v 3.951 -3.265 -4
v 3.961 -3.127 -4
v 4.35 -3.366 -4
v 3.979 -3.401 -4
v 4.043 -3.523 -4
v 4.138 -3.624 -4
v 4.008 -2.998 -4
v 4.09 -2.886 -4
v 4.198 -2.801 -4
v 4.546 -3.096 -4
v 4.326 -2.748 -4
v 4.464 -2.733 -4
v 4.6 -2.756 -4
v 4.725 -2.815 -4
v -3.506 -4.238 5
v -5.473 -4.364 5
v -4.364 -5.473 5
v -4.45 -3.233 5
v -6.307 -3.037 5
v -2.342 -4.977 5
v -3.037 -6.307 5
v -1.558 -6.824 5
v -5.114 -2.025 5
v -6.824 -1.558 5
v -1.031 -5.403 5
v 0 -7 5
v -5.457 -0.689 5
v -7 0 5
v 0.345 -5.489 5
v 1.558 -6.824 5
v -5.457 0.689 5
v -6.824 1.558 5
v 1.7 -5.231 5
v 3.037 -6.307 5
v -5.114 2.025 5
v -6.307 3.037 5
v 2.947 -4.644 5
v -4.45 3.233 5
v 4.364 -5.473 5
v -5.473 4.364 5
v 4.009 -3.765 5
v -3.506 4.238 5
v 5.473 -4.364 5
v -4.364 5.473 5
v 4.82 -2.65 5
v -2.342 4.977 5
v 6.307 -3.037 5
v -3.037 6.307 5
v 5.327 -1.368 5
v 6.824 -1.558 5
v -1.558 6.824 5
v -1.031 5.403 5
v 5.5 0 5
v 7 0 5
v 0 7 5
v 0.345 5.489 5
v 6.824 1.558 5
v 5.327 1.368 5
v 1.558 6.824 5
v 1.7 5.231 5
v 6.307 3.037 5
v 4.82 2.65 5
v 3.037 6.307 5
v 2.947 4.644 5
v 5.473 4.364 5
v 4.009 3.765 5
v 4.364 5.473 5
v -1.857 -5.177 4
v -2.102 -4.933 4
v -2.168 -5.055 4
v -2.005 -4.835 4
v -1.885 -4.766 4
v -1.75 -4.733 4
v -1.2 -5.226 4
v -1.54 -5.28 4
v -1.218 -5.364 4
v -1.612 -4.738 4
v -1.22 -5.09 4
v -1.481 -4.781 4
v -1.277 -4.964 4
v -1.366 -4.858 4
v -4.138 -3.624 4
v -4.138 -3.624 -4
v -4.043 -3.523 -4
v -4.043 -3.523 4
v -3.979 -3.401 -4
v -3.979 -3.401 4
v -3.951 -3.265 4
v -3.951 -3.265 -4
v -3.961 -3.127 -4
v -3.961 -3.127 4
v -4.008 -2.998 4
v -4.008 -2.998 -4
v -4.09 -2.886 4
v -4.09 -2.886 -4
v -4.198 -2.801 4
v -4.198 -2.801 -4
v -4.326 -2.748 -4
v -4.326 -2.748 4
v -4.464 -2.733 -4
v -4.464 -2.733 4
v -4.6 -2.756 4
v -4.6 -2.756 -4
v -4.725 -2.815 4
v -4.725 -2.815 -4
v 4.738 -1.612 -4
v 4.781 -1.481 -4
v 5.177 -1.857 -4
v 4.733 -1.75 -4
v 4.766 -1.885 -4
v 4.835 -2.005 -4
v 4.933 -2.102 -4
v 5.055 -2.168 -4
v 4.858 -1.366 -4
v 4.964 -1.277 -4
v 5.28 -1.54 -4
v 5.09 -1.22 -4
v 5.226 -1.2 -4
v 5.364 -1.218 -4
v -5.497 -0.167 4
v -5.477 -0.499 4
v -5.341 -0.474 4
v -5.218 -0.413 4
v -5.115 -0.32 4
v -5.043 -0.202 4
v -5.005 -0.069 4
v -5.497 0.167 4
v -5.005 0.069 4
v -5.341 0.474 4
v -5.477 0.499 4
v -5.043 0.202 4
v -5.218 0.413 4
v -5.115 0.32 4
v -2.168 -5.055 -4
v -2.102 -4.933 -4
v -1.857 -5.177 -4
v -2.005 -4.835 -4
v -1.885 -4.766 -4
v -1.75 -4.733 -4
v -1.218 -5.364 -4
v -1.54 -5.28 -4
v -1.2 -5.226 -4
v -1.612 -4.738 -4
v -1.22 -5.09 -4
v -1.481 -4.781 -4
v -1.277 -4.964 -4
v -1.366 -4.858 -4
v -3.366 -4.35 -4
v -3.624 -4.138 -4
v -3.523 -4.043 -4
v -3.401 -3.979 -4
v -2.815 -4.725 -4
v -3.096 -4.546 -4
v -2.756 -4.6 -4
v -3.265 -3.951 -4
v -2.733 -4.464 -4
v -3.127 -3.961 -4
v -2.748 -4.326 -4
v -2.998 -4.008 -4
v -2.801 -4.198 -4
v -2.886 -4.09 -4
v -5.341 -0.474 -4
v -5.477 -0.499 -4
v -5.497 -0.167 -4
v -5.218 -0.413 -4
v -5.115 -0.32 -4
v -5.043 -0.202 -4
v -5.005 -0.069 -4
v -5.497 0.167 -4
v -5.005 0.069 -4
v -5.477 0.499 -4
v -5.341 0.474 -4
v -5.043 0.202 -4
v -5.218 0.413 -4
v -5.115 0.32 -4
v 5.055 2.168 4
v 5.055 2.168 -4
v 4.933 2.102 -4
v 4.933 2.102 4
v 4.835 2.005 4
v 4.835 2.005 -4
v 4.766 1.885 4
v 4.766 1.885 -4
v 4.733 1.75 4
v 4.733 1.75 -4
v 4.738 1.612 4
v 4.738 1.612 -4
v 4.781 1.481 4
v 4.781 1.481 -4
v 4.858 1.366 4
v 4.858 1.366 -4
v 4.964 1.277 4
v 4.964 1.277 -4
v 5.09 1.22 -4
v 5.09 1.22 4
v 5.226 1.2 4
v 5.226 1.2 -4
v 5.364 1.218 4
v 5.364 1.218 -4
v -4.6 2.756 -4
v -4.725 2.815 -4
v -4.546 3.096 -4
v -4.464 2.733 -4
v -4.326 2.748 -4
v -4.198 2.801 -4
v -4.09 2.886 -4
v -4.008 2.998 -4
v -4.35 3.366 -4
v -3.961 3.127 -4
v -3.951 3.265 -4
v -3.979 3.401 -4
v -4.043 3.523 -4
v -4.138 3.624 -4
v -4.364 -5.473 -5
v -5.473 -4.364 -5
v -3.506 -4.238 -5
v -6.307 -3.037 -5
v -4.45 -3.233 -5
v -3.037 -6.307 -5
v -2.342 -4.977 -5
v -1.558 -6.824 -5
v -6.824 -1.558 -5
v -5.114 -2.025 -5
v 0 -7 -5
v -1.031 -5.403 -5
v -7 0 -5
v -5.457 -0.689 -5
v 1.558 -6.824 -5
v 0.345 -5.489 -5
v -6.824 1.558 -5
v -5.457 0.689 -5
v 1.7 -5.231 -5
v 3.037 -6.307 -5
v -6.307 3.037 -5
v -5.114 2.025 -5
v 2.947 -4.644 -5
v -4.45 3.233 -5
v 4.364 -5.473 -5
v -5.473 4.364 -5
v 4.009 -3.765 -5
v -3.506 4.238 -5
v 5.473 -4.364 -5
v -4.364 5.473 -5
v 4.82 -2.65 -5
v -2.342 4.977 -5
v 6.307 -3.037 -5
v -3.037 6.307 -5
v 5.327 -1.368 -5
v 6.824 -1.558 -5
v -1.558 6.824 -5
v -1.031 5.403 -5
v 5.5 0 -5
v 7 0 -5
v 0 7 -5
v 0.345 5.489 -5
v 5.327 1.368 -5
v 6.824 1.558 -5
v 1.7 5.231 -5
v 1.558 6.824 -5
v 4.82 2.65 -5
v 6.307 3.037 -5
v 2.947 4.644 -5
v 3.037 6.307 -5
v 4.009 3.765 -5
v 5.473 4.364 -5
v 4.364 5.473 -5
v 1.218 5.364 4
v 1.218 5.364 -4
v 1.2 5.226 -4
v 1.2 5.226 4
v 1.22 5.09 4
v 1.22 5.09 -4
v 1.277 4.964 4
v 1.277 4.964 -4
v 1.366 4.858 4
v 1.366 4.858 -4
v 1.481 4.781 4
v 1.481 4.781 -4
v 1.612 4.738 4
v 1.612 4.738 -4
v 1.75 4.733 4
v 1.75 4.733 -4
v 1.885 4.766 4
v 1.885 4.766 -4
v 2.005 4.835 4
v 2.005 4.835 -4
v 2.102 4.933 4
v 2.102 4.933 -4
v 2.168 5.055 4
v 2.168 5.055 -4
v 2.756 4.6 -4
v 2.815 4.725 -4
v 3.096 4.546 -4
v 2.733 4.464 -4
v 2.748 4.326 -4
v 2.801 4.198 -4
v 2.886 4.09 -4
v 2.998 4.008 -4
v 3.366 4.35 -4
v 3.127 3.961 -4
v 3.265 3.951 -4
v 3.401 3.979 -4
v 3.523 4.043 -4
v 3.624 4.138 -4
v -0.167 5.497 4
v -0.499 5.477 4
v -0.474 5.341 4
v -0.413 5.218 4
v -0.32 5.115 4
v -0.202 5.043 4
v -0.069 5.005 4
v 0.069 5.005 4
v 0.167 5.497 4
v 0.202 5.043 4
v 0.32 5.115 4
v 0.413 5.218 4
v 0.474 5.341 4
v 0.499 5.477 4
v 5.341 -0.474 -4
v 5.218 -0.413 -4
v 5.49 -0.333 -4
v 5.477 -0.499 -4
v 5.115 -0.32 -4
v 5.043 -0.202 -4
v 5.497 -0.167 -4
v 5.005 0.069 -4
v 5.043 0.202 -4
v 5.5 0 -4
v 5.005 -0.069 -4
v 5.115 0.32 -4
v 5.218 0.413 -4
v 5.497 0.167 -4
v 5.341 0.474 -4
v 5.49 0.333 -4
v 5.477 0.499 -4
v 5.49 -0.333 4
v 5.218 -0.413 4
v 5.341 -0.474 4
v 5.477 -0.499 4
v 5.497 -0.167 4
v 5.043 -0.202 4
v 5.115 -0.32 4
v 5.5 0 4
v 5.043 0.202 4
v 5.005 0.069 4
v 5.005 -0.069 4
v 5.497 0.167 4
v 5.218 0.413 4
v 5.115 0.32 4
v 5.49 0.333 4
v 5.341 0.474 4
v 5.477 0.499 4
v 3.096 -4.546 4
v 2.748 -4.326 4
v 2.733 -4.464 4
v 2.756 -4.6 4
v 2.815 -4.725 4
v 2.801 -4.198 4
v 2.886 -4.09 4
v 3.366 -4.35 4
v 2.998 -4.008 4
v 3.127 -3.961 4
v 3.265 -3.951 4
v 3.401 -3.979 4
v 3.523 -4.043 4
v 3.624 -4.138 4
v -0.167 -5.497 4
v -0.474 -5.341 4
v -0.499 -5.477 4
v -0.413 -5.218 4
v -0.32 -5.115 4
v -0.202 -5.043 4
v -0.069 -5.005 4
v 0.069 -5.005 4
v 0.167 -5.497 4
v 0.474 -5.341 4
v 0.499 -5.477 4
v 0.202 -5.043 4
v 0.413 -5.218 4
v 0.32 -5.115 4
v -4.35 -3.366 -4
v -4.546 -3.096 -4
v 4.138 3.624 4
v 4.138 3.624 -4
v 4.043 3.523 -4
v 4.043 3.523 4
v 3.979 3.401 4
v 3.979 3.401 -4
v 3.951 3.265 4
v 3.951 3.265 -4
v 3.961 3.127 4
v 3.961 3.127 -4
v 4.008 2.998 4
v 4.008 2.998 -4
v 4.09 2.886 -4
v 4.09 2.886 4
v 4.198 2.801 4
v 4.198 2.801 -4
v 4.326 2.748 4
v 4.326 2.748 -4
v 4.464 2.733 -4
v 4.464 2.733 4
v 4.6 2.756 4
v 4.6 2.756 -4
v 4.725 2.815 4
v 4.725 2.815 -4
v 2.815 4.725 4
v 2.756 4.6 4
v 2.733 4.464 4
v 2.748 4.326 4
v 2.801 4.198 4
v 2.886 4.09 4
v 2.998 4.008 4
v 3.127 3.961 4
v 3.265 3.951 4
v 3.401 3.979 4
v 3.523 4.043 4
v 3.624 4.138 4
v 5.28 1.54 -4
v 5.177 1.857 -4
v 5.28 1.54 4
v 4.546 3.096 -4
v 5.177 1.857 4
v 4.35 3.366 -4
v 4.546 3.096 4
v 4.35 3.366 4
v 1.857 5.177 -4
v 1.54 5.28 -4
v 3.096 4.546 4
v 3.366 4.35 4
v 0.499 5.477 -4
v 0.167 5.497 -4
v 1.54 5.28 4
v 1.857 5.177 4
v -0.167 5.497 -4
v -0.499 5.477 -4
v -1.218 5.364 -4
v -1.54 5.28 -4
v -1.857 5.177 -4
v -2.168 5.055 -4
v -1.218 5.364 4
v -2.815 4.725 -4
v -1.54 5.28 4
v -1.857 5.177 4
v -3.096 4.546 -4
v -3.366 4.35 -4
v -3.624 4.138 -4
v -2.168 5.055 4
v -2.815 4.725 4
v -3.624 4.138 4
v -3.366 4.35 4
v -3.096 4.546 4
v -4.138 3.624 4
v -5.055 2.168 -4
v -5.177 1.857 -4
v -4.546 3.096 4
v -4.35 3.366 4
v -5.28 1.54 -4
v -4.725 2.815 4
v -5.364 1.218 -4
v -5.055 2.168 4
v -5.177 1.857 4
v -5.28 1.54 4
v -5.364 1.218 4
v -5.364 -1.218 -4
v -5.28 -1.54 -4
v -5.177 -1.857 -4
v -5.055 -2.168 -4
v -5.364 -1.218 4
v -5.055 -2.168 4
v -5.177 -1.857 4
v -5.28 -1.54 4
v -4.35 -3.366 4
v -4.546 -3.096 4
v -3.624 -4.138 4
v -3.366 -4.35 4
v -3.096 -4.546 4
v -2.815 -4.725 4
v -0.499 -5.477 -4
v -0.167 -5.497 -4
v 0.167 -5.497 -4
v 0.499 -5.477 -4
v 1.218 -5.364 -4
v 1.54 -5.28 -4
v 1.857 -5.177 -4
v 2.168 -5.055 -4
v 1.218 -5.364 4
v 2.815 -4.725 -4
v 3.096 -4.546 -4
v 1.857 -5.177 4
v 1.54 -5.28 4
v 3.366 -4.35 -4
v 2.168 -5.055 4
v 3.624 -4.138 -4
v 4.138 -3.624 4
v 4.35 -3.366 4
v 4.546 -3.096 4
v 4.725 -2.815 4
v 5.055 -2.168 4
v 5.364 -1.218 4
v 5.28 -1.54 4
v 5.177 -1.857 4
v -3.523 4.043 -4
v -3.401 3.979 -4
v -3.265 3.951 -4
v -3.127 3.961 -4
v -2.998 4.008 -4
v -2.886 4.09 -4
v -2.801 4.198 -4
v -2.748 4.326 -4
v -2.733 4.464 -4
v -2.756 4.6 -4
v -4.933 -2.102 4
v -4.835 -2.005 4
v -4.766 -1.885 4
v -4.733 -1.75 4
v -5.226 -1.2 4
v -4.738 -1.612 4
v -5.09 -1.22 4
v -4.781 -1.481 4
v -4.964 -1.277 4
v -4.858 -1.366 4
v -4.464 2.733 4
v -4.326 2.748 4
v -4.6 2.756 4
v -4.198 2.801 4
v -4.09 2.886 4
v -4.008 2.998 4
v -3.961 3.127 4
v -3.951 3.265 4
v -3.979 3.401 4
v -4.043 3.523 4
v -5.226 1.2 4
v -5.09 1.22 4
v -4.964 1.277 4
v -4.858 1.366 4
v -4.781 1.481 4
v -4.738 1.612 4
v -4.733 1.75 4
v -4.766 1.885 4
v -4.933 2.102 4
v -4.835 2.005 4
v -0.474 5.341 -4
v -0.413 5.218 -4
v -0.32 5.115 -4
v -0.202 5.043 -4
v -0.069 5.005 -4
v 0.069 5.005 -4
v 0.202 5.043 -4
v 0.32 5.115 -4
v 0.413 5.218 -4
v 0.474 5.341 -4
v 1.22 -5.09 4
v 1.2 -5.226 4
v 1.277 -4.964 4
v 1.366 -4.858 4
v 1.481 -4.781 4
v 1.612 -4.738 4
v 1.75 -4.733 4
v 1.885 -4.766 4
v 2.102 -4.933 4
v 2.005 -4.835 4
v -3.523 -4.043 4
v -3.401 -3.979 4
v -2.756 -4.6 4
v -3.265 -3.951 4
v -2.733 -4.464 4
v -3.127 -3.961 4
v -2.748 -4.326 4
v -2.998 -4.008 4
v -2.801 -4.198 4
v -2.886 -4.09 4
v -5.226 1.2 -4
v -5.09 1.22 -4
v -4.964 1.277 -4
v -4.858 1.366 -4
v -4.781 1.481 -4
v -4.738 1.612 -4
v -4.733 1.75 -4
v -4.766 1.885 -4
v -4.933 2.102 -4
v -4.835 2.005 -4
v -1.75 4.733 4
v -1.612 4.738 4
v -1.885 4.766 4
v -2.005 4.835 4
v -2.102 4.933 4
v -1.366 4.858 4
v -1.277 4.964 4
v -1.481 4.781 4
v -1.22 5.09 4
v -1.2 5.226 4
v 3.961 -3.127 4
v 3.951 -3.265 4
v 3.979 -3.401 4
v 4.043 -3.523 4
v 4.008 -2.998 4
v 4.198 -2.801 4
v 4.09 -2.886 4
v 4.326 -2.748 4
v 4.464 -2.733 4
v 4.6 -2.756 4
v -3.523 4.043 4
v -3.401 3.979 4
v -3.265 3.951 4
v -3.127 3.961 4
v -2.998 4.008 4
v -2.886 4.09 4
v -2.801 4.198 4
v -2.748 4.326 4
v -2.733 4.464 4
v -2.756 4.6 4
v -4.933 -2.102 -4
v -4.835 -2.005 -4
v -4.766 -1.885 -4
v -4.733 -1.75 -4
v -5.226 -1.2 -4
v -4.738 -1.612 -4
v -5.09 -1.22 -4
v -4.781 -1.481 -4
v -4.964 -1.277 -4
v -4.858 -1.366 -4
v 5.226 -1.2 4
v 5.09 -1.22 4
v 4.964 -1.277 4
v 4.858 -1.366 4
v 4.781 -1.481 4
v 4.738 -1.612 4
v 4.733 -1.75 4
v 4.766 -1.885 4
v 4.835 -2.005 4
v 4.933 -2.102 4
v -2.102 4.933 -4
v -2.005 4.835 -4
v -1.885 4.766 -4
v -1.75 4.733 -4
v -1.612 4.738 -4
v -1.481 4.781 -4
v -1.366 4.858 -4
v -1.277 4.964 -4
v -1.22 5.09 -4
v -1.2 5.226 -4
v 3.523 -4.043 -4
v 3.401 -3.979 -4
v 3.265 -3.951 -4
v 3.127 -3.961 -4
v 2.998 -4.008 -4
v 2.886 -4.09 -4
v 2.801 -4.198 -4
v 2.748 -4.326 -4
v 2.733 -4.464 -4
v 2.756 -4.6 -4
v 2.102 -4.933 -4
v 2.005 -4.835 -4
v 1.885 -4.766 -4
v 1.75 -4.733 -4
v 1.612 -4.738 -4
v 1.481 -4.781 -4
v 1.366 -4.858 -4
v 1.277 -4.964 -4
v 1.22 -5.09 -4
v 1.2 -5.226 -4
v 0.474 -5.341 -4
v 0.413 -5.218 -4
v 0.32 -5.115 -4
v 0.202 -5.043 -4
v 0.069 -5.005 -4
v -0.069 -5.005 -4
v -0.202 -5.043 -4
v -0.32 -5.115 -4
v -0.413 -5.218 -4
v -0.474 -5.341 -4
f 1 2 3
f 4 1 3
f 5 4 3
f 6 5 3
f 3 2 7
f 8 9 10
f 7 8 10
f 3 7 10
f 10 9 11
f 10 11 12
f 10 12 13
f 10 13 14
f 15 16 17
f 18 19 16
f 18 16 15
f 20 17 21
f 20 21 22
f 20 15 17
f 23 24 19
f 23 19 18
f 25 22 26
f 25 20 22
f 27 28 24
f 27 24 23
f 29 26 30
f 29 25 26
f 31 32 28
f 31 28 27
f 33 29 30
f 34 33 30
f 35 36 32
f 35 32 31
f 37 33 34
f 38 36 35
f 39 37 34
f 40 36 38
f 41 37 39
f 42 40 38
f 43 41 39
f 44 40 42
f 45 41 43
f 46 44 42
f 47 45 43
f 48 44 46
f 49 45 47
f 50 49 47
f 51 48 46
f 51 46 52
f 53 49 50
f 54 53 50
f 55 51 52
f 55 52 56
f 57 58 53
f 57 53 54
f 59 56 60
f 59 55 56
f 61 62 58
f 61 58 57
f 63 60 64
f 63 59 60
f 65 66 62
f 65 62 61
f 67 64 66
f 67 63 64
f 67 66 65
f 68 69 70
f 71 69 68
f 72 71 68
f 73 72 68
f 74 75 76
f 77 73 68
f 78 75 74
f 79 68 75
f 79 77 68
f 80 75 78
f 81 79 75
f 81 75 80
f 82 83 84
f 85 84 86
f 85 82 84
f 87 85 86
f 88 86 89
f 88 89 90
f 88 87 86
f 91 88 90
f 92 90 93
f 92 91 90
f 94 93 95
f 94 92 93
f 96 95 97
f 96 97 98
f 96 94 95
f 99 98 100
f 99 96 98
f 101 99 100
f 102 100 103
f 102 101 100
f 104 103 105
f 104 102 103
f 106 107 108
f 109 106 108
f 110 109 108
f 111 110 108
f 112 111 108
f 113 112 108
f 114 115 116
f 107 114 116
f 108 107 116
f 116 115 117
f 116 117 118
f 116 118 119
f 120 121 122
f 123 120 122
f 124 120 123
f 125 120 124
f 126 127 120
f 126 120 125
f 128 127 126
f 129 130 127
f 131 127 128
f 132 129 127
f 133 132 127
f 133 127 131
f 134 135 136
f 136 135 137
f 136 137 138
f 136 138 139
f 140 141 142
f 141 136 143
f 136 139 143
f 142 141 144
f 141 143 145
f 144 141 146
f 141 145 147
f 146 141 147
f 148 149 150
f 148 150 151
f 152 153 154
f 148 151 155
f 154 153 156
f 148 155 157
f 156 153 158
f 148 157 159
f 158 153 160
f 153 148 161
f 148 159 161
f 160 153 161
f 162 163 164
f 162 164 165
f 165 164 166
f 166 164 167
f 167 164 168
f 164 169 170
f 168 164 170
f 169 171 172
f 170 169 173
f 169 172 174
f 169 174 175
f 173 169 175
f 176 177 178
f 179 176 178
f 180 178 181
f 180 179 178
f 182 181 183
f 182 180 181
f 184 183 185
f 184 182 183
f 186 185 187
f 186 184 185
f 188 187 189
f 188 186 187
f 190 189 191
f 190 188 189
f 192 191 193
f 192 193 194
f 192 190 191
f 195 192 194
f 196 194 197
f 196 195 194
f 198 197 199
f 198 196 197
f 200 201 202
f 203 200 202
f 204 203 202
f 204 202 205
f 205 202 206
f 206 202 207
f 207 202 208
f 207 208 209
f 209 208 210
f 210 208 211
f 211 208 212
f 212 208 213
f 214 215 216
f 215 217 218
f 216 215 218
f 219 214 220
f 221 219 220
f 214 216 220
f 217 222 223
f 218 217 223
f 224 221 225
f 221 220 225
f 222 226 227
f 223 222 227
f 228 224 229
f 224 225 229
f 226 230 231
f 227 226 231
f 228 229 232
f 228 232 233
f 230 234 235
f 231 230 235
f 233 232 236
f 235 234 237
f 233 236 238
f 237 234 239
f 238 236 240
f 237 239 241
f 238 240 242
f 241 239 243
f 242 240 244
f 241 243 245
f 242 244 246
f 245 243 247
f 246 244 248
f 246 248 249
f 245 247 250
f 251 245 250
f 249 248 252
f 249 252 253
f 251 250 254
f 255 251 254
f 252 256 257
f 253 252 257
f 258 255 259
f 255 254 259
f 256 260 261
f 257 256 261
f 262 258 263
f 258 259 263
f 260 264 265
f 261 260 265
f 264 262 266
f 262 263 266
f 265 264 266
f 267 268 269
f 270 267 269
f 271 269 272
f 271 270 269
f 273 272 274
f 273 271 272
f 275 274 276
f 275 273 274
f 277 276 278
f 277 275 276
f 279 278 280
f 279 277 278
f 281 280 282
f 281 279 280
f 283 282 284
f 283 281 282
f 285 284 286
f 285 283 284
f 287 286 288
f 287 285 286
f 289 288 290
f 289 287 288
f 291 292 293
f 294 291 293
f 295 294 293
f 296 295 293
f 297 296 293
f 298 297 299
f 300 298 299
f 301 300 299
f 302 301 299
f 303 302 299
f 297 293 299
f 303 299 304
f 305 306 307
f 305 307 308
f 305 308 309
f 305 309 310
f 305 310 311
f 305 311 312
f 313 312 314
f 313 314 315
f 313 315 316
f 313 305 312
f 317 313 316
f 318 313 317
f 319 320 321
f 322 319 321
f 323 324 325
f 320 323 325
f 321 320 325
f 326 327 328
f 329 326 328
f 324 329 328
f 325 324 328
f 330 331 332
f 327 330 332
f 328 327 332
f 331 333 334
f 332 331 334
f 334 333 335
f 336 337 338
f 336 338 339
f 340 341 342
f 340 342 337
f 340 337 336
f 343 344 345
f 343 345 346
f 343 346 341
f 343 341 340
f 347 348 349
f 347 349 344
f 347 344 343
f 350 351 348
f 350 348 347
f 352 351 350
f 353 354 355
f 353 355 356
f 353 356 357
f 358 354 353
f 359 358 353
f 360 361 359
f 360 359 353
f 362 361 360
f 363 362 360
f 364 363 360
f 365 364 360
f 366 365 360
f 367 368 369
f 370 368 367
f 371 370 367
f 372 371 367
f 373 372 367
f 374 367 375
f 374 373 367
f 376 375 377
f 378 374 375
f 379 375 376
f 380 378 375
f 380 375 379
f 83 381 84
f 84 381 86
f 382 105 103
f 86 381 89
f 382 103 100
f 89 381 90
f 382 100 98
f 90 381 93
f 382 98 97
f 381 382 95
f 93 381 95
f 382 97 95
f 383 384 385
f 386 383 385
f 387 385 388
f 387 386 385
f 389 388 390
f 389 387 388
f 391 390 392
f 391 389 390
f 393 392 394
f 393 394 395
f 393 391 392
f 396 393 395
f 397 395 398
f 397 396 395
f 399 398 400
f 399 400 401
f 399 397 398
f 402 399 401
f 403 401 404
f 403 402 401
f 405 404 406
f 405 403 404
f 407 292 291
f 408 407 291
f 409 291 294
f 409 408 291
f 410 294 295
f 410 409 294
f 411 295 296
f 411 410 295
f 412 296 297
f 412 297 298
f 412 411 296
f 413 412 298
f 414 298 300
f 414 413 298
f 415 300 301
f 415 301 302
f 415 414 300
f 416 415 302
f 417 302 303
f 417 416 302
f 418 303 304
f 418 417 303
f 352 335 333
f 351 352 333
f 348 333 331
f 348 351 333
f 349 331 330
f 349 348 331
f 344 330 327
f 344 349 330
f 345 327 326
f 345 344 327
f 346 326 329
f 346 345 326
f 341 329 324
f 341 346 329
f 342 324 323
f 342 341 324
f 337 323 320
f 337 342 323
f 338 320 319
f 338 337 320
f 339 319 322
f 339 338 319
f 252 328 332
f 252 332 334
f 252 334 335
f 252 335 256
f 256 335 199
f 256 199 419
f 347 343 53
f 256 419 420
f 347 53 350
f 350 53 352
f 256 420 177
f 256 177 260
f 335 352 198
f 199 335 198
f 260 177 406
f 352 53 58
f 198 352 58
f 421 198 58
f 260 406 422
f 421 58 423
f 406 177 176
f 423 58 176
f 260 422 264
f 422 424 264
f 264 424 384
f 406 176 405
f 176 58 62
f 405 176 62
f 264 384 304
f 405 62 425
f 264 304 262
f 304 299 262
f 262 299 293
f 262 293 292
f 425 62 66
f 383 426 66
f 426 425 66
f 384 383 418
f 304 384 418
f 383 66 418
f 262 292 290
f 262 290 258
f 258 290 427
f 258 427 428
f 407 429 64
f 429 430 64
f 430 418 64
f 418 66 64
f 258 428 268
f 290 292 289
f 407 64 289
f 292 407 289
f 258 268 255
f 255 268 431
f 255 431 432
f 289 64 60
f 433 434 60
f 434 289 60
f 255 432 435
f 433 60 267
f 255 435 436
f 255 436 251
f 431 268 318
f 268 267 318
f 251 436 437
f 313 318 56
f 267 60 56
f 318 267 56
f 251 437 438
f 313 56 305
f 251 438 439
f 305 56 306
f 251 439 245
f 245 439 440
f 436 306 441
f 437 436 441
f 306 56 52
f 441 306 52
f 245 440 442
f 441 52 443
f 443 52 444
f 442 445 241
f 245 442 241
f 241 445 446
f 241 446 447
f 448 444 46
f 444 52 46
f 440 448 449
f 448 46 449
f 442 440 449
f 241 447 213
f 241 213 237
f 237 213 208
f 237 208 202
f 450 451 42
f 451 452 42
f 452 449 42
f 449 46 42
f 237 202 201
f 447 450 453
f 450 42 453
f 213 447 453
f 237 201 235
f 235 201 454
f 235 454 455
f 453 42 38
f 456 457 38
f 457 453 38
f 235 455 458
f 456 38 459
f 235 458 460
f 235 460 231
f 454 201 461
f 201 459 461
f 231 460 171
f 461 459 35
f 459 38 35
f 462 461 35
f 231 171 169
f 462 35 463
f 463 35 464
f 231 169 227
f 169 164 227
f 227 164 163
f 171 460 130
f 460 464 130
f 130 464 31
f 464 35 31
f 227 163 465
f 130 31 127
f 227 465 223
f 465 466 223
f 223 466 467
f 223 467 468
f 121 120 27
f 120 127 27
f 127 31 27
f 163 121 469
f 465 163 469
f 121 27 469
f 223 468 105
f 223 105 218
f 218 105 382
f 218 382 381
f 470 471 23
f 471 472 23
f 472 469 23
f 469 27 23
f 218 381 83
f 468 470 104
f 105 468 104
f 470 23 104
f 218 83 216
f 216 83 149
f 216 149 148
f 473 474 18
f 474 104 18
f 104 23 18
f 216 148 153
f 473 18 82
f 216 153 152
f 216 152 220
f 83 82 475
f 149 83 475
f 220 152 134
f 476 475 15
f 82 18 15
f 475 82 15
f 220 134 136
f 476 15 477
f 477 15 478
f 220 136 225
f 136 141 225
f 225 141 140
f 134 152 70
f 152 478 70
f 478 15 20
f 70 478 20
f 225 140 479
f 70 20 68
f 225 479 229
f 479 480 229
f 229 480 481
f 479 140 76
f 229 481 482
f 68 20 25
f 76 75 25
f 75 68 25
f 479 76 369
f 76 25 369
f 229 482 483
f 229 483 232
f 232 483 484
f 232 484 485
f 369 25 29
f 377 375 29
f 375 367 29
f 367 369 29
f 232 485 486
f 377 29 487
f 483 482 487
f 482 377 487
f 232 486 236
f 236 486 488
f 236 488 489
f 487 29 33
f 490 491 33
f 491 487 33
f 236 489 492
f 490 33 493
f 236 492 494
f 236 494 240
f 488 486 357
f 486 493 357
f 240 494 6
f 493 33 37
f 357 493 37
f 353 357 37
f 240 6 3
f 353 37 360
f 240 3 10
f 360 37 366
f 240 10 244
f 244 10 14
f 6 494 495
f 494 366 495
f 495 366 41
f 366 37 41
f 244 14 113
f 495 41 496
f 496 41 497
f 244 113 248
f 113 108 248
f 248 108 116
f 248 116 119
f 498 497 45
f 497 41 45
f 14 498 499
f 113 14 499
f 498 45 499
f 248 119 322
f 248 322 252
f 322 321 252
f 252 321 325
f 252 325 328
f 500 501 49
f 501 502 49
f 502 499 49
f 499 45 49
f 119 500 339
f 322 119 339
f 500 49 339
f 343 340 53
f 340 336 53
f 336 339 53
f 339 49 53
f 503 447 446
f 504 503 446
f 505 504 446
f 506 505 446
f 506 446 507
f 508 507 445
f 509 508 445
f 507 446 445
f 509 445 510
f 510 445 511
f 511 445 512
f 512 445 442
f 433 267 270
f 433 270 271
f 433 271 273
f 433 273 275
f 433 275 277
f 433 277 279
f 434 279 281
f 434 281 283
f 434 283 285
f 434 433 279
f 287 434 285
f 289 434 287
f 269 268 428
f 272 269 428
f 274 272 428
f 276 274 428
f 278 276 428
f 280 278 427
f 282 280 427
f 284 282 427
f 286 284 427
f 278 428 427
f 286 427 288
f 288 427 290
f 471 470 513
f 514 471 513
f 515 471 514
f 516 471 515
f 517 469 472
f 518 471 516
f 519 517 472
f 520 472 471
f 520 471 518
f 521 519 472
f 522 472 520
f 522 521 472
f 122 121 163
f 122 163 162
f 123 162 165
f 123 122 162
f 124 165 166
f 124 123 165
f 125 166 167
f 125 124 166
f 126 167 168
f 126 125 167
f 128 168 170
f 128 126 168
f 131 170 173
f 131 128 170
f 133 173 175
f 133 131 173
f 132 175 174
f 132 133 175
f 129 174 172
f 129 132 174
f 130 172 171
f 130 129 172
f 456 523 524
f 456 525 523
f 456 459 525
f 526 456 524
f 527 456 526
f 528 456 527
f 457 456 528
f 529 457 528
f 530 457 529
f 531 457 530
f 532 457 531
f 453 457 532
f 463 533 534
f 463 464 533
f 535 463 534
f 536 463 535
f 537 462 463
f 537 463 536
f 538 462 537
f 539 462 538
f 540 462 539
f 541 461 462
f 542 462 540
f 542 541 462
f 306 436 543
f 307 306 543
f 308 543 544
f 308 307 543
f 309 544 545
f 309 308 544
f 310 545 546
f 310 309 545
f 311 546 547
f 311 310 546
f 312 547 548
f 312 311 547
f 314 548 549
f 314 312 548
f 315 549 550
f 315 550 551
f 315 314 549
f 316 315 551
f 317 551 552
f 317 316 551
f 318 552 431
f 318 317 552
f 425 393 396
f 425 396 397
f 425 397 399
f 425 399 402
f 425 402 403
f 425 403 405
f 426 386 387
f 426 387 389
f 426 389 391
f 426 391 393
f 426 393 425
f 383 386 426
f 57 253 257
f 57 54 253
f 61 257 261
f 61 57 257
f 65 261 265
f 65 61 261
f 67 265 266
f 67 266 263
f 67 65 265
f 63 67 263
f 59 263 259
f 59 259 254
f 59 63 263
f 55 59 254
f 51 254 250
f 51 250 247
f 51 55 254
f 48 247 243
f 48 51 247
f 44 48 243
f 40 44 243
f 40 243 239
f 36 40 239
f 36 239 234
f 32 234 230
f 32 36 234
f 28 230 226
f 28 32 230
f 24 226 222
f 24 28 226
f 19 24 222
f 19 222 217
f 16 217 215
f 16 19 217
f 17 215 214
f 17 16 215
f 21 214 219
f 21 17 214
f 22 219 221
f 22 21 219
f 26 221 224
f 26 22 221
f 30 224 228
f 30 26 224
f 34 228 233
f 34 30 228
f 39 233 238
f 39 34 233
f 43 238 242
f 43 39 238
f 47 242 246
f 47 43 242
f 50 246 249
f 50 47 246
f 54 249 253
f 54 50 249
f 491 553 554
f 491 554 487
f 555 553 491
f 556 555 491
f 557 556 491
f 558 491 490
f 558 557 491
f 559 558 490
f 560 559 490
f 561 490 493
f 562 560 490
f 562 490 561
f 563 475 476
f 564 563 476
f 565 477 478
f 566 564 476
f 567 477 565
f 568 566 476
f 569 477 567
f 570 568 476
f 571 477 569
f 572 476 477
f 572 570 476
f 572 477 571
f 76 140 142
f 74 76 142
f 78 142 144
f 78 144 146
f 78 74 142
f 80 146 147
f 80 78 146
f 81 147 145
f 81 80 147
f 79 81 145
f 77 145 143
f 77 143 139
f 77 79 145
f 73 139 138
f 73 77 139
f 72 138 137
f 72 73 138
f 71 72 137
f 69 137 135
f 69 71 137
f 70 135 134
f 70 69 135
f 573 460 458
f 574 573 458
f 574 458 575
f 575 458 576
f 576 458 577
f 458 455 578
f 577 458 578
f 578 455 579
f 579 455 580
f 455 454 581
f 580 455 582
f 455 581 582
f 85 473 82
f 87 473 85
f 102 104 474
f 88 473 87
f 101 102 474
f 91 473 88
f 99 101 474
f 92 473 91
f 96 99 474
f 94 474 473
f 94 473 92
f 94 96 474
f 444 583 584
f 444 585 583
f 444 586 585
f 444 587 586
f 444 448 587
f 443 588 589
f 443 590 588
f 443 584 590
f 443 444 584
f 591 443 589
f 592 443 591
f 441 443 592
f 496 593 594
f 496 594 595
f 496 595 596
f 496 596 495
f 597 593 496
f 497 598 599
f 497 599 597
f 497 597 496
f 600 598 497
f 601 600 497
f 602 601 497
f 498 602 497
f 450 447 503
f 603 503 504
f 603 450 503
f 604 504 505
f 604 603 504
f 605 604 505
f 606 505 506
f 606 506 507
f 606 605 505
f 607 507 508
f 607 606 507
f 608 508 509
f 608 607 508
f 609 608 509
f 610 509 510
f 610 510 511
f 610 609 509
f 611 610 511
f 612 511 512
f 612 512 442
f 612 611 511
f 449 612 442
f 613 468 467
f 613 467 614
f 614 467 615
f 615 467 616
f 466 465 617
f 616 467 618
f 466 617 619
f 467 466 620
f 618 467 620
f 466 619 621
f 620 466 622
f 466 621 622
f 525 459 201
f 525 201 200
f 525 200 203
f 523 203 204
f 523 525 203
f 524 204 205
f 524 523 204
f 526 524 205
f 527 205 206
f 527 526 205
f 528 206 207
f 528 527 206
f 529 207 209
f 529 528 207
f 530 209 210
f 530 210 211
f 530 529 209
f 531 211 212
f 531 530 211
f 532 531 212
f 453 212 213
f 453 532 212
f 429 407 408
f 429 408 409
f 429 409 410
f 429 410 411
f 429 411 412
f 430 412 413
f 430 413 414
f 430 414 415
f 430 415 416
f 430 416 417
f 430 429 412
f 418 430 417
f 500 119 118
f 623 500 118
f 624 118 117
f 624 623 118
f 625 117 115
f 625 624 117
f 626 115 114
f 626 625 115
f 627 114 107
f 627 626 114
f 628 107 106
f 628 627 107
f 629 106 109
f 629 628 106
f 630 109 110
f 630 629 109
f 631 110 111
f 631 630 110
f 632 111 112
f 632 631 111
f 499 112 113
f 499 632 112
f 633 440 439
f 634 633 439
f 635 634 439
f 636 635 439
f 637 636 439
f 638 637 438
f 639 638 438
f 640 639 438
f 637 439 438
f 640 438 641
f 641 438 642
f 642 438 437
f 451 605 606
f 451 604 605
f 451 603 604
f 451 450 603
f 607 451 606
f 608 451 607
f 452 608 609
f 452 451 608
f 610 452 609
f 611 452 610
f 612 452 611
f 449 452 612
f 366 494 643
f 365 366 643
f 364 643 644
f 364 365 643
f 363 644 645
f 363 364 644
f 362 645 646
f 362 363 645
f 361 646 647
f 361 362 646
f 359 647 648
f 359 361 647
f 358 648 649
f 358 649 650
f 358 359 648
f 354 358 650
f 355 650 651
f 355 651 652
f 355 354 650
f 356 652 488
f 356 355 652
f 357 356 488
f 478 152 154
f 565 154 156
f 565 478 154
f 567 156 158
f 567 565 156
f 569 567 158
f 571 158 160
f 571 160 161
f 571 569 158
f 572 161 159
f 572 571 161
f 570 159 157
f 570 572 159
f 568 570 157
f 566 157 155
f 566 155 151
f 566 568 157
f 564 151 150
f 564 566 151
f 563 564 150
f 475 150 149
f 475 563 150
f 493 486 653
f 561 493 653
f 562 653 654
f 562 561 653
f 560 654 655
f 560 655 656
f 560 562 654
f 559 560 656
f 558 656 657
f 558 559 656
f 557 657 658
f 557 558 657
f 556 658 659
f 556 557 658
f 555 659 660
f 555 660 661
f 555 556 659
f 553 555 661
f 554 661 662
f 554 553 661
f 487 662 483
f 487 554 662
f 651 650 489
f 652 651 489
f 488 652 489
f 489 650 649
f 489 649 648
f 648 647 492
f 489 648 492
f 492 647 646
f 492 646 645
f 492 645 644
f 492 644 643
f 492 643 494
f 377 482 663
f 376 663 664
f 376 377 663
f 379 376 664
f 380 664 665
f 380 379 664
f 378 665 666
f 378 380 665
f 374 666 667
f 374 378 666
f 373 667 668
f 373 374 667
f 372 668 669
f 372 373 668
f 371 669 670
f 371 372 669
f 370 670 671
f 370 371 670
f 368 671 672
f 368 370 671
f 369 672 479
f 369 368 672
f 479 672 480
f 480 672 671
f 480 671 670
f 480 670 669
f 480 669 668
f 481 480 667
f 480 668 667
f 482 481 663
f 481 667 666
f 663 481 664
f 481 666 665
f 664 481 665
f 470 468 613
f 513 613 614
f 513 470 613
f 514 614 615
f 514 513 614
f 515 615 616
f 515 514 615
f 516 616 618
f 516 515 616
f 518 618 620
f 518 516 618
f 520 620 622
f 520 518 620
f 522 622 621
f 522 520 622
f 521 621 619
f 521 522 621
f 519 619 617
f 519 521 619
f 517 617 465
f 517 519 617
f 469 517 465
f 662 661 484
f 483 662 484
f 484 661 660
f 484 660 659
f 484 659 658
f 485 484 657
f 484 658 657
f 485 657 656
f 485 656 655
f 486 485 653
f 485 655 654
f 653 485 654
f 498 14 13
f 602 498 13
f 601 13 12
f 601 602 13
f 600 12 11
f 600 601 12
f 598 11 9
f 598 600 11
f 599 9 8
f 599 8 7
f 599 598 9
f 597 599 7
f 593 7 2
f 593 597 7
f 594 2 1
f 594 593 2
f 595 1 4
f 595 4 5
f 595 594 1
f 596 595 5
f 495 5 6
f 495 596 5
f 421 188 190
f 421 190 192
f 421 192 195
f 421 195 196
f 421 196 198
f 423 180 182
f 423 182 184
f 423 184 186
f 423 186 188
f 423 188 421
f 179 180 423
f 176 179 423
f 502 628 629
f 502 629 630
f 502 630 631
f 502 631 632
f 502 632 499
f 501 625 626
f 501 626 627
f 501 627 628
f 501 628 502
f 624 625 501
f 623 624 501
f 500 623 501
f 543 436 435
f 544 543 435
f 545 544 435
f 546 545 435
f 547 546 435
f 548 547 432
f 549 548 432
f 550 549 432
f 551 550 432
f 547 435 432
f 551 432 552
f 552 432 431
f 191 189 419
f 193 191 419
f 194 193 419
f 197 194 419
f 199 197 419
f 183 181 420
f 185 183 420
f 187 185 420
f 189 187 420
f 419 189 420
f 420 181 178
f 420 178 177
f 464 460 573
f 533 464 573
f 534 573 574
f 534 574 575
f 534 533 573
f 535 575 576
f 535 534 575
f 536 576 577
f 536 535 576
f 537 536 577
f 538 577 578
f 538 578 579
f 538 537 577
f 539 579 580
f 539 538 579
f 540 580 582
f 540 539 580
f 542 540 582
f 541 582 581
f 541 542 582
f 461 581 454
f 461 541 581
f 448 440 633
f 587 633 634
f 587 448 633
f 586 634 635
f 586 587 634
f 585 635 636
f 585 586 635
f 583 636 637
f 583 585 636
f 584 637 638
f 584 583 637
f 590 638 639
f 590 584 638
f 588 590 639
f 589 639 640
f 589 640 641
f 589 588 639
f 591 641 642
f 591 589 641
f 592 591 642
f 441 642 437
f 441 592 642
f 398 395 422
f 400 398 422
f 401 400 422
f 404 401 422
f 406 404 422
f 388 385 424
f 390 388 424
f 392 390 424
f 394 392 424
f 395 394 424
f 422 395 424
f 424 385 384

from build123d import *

# Parameters (mm, degrees)
F0_R          = 7
F0_R_2        = 5.5
F1_DEPTH      = 5
F1_DEPTH_BACK = 5
F2_R          = 0.5
F3_DEPTH      = 4
F3_DEPTH_BACK = 4


with BuildPart() as f1:
    # F0 (on Top) → F1 (new body, two sides)
    with BuildSketch(Plane.XY) as f1_sk:
        Circle(F0_R)
        Circle(F0_R_2, mode=Mode.SUBTRACT)
    extrude(amount=F1_DEPTH)
    extrude(f1_sk.sketch, amount=-F1_DEPTH_BACK)

    # F2 (on Top) → F3 (join, two sides)
    with BuildSketch(Plane.XY) as f3_sk:
        with Locations((0, 5.5)):
            Circle(F2_R)
        with Locations((-1.699593, 5.230811)):
            Circle(F2_R)
        with Locations((-3.232819, 4.449593)):
            Circle(F2_R)
        with Locations((-4.449593, 3.232819)):
            Circle(F2_R)
        with Locations((-5.230811, 1.699593)):
            Circle(F2_R)
        with Locations((-5.5, 0)):
            Circle(F2_R)
        with Locations((-5.230811, -1.699593)):
            Circle(F2_R)
        with Locations((-4.449593, -3.232819)):
            Circle(F2_R)
        with Locations((-3.232819, -4.449593)):
            Circle(F2_R)
        with Locations((-1.699593, -5.230811)):
            Circle(F2_R)
        with Locations((0, -5.5)):
            Circle(F2_R)
        with Locations((1.699593, -5.230811)):
            Circle(F2_R)
        with Locations((3.232819, -4.449593)):
            Circle(F2_R)
        with Locations((4.449593, -3.232819)):
            Circle(F2_R)
        with Locations((5.230811, -1.699593)):
            Circle(F2_R)
        with Locations((5.5, 0)):
            Circle(F2_R)
        with Locations((5.230811, 1.699593)):
            Circle(F2_R)
        with Locations((4.449593, 3.232819)):
            Circle(F2_R)
        with Locations((3.232819, 4.449593)):
            Circle(F2_R)
        with Locations((1.699593, 5.230811)):
            Circle(F2_R)
    extrude(amount=F3_DEPTH)
    extrude(f3_sk.sketch, amount=-F3_DEPTH_BACK)


solid = f1.part
